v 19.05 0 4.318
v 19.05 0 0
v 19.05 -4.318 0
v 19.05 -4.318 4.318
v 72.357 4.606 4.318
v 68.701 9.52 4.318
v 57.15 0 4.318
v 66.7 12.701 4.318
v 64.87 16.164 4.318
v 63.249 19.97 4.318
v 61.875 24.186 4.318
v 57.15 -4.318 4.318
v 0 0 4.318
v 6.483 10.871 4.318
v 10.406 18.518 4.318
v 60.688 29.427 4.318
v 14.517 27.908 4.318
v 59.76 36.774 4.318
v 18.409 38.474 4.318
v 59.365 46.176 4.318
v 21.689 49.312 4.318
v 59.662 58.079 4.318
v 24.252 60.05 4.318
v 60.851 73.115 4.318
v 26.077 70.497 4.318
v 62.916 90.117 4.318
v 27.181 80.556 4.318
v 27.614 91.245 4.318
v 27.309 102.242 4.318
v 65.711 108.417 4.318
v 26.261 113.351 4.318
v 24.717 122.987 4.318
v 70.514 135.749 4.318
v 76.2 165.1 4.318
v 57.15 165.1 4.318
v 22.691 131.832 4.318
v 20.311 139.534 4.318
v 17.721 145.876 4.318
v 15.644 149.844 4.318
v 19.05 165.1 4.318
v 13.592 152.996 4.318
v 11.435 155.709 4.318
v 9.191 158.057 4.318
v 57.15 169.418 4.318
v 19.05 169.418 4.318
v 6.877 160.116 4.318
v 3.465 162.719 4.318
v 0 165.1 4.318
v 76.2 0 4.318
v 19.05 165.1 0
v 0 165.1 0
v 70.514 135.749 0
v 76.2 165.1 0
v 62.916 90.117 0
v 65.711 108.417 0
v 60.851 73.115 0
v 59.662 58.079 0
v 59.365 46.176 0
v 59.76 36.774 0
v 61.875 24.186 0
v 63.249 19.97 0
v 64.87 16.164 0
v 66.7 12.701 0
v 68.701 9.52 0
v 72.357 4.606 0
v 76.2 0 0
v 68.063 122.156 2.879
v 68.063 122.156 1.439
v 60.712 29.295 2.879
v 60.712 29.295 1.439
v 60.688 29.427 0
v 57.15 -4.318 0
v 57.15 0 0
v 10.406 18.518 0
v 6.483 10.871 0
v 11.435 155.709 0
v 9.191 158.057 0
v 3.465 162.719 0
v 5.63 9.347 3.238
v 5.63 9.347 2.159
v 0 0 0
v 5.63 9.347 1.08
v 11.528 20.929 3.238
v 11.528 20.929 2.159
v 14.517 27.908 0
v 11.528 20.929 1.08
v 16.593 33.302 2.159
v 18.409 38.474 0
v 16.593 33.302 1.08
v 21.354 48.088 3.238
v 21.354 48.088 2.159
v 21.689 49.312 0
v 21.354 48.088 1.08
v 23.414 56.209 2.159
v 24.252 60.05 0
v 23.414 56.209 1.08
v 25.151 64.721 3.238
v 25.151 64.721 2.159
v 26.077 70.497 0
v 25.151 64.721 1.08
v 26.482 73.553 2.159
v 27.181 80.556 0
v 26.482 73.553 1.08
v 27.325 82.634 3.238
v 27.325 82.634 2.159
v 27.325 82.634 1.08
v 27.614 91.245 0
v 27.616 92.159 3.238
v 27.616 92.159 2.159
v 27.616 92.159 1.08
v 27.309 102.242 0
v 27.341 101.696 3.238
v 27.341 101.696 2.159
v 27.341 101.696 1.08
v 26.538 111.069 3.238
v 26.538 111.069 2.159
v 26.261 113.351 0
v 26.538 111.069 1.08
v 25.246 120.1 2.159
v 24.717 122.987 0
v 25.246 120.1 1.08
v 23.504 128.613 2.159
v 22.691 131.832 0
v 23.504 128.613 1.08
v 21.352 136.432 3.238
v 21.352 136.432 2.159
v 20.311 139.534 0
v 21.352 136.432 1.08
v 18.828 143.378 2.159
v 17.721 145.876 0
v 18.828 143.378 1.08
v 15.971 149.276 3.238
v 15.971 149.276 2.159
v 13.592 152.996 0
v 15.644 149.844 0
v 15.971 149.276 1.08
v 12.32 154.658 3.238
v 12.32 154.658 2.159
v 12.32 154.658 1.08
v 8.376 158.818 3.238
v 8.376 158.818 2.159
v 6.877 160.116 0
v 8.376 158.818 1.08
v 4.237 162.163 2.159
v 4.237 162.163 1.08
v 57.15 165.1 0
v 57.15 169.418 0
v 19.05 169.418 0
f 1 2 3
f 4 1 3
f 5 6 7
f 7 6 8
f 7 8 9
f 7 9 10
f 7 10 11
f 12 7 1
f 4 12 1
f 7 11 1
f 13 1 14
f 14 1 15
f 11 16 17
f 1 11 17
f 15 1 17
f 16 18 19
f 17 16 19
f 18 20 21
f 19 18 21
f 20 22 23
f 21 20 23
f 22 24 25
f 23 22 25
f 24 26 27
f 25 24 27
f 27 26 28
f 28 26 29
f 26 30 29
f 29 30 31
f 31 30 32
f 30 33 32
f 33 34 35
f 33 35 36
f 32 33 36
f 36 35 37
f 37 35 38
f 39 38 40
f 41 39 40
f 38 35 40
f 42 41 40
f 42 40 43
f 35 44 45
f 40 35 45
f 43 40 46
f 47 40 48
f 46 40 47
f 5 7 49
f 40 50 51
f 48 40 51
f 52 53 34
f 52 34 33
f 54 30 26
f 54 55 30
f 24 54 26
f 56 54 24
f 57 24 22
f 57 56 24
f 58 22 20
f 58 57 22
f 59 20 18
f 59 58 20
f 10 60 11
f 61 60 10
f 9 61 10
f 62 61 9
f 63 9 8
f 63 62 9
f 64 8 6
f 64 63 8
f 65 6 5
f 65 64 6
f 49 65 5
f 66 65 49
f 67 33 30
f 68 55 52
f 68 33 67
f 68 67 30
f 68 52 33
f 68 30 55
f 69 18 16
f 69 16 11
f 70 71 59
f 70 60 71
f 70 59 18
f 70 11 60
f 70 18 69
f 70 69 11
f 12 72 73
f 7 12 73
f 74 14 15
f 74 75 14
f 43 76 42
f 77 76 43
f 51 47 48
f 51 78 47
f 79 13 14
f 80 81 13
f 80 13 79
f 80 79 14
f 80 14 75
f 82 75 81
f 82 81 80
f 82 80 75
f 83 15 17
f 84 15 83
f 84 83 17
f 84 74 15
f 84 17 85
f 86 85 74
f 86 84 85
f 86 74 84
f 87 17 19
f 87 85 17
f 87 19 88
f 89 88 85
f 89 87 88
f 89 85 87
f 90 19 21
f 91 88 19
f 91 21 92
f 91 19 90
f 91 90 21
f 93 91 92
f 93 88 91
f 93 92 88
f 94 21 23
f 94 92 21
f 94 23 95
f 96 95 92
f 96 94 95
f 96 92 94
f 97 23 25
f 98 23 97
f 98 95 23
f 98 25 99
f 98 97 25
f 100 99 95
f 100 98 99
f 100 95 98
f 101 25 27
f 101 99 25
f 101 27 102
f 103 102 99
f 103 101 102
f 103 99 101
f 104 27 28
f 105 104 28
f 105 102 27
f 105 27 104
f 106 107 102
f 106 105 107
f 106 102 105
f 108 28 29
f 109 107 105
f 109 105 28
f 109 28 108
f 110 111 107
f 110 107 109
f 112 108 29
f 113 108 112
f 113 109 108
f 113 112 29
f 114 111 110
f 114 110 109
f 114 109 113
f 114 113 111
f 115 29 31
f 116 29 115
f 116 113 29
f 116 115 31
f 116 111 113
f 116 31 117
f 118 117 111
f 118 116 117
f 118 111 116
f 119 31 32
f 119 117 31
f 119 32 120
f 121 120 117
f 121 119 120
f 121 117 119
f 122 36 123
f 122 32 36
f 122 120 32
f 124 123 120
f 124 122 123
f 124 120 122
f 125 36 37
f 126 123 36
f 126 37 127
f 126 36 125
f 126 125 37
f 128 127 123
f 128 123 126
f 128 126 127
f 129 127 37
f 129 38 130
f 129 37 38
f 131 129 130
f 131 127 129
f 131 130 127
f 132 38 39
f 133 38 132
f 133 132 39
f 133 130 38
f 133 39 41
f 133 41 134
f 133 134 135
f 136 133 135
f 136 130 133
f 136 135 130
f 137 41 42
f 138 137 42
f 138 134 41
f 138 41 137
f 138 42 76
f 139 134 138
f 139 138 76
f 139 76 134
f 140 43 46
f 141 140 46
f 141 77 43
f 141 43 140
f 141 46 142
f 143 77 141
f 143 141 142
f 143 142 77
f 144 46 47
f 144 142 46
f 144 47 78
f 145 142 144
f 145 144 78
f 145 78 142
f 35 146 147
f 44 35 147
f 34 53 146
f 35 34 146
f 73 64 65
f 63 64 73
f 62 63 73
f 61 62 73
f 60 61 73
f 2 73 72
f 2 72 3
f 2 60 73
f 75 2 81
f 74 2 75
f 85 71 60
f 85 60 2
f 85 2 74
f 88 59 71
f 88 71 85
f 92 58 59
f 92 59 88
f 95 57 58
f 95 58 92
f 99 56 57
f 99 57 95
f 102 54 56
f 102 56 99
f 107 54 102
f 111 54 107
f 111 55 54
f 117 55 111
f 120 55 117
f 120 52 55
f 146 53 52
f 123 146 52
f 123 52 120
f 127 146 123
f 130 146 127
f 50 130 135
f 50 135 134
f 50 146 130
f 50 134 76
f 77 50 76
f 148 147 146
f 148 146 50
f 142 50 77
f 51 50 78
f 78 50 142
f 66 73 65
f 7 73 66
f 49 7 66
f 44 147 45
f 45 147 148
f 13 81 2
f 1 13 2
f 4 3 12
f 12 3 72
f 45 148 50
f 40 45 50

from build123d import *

# Parameters (mm, degrees)
F1_DEPTH = 4.318


with BuildPart() as f1:
    # F0 (on Top) → F1 (new body)
    with BuildSketch(Plane.XY):
        with BuildLine():
            add(Edge.make_bspline(
                [(0, 0), (3.7239435602, 5.9826129798), (13.5279444344, 21.7329974678), (33.6444944528, 81.4147827759), (21.1752610202, 150.8152430484), (5.6709057406, 161.2744268407), (0, 165.1)],
                knots=[0, 0, 0, 0, 0.189224589, 0.4981702881, 0.8164497045, 1, 1, 1, 1], degree=3))
            Line((0, 0), (19.05, 0))
            Line((19.05, 0), (19.05, -4.318))
            Line((19.05, -4.318), (57.15, -4.318))
            Line((57.15, -4.318), (57.15, 0))
            Line((57.15, 0), (76.2, 0))
            add(Edge.make_bspline(
                [(76.2, 165.1), (73.7900221631, 153.0298067545), (67.8618146993, 123.3388242929), (52.4049122742, 27.9697730912), (69.7279947616, 7.6074742842), (76.2, 0)],
                knots=[0, 0, 0, 0, 0.3002482778, 0.7385686517, 1, 1, 1, 1], degree=3))
            Line((76.2, 165.1), (57.15, 165.1))
            Line((57.15, 165.1), (57.15, 169.418))
            Line((57.15, 169.418), (19.05, 169.418))
            Line((19.05, 169.418), (19.05, 165.1))
            Line((19.05, 165.1), (0, 165.1))
        make_face()
    extrude(amount=F1_DEPTH)


solid = f1.part
